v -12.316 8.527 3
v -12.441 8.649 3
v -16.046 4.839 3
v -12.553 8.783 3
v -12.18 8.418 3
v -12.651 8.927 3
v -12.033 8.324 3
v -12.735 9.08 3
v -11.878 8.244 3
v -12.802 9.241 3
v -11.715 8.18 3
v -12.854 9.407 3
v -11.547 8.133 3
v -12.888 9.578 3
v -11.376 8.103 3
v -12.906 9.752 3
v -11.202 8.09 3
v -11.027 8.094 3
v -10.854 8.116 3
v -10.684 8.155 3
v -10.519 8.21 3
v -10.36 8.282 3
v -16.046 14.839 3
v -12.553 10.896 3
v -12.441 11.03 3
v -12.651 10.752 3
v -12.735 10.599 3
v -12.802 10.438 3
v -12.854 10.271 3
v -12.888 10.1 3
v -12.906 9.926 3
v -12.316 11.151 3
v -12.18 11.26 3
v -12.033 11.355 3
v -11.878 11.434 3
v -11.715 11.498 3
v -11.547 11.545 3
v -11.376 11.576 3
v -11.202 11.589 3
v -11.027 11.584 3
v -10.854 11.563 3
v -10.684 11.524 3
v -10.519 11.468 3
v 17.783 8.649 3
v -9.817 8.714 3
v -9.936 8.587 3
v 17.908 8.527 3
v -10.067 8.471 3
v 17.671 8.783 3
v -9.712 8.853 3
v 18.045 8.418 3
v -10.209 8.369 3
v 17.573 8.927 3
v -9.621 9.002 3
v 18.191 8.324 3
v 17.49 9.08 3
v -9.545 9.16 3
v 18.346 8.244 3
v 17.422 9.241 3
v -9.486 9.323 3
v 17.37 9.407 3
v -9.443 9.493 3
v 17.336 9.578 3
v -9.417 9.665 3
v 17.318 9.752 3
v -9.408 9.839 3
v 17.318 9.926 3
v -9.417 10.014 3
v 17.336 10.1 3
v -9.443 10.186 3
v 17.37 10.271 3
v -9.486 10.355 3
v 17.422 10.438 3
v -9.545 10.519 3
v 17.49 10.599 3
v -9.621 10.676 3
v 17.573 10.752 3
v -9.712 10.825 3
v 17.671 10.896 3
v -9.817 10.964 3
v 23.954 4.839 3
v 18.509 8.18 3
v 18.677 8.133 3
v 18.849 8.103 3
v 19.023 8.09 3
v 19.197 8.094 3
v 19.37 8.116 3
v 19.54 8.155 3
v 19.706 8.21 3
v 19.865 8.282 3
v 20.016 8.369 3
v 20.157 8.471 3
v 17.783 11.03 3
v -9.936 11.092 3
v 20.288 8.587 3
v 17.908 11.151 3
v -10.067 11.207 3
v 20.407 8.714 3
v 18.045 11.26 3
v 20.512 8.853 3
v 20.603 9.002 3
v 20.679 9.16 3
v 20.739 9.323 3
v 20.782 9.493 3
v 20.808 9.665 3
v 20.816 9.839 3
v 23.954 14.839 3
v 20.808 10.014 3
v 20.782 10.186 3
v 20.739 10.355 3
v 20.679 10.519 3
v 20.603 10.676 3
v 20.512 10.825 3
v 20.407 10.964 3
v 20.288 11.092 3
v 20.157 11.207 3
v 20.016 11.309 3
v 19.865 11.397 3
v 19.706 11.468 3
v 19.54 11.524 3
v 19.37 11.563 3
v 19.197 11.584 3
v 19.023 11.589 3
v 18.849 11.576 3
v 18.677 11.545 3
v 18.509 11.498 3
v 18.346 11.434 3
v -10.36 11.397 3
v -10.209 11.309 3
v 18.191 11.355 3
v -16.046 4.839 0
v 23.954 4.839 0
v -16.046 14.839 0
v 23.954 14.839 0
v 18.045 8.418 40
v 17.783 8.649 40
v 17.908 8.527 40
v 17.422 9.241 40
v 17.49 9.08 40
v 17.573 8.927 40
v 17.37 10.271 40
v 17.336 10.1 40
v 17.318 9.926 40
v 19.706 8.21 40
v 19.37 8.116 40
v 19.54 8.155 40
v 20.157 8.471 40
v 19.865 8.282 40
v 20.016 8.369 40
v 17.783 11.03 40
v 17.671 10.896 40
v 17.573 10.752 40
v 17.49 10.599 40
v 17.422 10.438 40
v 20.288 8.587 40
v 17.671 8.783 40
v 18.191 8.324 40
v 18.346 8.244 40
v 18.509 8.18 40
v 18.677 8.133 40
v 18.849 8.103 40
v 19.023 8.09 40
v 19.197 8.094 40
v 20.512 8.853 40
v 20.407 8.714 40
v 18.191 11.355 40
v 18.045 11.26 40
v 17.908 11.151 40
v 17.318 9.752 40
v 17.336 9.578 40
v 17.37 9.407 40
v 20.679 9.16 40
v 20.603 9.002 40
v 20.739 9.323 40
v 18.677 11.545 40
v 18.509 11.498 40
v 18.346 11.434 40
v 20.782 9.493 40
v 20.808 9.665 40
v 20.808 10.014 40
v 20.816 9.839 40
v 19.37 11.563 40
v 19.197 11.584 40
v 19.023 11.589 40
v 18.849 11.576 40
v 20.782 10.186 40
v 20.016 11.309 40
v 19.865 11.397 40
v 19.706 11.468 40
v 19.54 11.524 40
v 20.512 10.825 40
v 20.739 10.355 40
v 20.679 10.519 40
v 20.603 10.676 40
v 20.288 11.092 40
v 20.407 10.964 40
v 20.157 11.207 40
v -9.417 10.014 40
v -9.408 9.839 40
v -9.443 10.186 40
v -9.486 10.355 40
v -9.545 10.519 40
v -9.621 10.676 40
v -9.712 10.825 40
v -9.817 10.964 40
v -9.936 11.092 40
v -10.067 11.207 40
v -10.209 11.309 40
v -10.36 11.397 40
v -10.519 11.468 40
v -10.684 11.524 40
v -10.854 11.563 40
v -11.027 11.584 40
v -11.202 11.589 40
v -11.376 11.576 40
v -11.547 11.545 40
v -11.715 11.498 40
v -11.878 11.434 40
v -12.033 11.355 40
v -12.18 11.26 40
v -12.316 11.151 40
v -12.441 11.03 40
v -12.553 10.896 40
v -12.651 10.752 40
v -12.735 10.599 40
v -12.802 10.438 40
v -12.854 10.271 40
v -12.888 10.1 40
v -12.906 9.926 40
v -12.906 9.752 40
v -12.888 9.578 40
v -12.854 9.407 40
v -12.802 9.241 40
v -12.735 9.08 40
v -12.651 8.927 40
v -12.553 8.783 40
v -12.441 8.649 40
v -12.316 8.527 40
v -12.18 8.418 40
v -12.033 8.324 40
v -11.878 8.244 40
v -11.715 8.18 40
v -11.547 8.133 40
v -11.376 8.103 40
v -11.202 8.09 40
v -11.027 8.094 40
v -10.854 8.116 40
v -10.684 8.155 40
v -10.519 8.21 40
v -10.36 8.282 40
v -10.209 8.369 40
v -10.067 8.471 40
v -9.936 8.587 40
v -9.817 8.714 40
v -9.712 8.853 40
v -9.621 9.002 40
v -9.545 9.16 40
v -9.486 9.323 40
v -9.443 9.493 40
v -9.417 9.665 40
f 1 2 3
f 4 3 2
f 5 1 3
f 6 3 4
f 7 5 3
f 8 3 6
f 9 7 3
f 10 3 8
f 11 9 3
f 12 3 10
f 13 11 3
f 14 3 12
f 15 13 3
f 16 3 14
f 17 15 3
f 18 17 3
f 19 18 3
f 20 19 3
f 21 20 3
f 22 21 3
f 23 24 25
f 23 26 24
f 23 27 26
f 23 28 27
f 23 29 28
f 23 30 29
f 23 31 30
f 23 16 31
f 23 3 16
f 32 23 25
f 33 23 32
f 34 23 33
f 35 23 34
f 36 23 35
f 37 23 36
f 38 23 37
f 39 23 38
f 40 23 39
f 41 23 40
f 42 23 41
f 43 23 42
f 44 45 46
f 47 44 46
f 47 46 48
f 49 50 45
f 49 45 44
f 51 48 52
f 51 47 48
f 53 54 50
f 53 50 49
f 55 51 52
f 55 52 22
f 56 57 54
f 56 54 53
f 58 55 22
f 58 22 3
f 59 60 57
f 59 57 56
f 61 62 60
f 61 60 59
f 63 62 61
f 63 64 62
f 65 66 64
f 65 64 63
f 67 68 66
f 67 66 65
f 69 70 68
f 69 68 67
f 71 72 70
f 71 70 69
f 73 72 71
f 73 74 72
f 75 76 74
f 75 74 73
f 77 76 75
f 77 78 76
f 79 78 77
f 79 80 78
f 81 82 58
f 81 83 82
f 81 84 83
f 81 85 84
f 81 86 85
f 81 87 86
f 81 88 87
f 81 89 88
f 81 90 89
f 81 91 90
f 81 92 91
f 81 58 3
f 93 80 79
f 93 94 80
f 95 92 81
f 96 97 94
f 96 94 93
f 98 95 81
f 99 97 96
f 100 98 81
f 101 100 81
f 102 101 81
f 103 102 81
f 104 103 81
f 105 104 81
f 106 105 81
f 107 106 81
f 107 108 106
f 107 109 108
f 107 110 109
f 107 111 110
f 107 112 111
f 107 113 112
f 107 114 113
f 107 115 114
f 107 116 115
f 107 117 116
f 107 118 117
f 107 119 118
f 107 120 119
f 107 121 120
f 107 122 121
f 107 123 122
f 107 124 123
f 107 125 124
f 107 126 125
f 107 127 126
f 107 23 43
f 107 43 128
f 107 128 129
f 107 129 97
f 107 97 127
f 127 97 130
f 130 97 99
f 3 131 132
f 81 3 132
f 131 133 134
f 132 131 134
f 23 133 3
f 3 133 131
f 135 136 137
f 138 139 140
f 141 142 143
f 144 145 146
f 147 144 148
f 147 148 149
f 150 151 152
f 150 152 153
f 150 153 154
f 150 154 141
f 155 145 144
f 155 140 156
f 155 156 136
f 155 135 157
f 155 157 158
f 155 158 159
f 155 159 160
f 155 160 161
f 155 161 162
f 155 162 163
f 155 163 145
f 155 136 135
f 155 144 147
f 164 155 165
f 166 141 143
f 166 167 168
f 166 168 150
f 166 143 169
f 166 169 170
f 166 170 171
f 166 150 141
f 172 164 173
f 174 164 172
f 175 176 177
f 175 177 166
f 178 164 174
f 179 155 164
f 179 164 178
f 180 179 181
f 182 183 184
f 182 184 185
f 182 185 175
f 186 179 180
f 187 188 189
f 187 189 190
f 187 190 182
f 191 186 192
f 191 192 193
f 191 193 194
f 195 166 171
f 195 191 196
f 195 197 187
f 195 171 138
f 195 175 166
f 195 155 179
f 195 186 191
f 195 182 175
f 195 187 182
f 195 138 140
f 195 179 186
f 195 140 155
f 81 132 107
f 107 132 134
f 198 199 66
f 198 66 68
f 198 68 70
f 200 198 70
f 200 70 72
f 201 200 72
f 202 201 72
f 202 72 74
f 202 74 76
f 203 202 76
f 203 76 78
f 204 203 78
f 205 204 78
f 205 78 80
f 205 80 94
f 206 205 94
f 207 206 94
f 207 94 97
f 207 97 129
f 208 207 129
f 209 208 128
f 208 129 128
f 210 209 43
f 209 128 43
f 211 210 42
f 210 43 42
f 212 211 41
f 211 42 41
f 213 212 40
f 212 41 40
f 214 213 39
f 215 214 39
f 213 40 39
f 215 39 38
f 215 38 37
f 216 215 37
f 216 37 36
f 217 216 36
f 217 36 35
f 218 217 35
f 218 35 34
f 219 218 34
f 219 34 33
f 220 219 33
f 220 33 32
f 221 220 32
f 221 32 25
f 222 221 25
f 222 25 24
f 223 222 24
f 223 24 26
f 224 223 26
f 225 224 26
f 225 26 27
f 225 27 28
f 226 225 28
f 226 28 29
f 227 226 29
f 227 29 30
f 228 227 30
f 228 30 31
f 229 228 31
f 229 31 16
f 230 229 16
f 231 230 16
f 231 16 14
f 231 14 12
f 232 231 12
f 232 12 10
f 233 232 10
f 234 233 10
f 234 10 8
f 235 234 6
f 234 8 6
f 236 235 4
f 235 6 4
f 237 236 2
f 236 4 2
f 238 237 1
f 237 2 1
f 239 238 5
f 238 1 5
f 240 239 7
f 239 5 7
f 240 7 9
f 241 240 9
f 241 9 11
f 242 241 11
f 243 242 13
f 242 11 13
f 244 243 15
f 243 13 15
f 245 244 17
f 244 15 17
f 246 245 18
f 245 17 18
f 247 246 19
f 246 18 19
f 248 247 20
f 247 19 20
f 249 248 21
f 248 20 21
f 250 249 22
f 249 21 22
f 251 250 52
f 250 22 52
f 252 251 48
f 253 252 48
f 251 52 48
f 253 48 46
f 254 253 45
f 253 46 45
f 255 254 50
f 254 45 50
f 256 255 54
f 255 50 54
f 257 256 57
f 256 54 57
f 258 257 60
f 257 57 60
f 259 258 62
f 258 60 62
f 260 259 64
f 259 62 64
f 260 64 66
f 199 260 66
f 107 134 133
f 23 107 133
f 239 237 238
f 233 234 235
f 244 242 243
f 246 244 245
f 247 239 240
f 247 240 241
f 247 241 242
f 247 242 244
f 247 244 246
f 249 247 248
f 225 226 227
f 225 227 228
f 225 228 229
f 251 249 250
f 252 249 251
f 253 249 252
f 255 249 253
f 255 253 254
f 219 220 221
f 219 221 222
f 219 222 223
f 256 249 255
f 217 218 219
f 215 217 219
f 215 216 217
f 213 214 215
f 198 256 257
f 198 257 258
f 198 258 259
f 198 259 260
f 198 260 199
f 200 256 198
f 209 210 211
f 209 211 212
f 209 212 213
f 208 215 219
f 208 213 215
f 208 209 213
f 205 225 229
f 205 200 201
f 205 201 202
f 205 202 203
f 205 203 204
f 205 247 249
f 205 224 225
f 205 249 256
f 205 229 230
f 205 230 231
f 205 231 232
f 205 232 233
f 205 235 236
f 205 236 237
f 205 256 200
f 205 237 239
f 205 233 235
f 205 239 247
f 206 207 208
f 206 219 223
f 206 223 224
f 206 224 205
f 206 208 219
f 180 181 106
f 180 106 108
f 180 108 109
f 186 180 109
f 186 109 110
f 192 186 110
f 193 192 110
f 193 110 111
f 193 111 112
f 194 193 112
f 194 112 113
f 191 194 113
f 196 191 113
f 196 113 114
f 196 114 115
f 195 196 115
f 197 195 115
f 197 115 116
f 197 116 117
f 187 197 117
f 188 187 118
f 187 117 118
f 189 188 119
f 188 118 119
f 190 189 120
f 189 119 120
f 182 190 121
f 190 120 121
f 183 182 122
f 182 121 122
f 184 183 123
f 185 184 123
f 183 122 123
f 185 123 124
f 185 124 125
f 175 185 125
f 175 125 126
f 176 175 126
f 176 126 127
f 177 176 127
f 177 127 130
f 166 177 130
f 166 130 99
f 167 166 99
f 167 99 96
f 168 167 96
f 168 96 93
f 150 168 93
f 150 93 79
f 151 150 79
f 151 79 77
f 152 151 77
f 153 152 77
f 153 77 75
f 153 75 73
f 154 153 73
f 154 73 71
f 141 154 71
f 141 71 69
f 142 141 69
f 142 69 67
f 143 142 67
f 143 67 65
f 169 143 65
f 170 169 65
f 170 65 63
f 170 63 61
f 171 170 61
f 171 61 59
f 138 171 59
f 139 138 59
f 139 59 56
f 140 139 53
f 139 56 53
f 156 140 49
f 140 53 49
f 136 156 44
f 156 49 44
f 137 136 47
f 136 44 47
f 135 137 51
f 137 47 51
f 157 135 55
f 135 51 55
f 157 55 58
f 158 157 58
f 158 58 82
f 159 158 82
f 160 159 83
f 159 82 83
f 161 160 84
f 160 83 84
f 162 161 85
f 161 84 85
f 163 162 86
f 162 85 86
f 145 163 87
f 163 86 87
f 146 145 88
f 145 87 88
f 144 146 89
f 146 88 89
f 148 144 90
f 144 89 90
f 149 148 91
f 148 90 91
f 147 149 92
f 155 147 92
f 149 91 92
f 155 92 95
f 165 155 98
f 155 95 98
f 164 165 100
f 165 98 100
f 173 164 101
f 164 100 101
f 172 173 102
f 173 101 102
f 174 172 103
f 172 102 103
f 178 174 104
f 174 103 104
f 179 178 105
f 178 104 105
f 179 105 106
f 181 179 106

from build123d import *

# Parameters (mm, degrees)
F0_R     = 1.75
F1_DEPTH = 3
F2_DEPTH = 40


with BuildPart() as f1:
    # F0 (on Top) → F1 (new body)
    with BuildSketch(Plane.XY):
        Polygon((3.954127, 14.839267), (-16.045873, 14.839267), (-16.045873, 4.839267), (3.954127, 4.839267), (23.954127, 4.839267), (23.954127, 14.839267), align=None)
        with Locations((-11.157998, 9.839267)):
            Circle(F0_R, mode=Mode.SUBTRACT)
        with Locations((19.066252, 9.839267)):
            Circle(F0_R, mode=Mode.SUBTRACT)
    extrude(amount=F1_DEPTH)

    # F0 (on Top) → F2 (join)
    with BuildSketch(Plane.XY):
        with Locations((19.066252, 9.839267)):
            Circle(F0_R)
        with Locations((-11.157998, 9.839267)):
            Circle(F0_R)
    extrude(amount=F2_DEPTH)


solid = f1.part
